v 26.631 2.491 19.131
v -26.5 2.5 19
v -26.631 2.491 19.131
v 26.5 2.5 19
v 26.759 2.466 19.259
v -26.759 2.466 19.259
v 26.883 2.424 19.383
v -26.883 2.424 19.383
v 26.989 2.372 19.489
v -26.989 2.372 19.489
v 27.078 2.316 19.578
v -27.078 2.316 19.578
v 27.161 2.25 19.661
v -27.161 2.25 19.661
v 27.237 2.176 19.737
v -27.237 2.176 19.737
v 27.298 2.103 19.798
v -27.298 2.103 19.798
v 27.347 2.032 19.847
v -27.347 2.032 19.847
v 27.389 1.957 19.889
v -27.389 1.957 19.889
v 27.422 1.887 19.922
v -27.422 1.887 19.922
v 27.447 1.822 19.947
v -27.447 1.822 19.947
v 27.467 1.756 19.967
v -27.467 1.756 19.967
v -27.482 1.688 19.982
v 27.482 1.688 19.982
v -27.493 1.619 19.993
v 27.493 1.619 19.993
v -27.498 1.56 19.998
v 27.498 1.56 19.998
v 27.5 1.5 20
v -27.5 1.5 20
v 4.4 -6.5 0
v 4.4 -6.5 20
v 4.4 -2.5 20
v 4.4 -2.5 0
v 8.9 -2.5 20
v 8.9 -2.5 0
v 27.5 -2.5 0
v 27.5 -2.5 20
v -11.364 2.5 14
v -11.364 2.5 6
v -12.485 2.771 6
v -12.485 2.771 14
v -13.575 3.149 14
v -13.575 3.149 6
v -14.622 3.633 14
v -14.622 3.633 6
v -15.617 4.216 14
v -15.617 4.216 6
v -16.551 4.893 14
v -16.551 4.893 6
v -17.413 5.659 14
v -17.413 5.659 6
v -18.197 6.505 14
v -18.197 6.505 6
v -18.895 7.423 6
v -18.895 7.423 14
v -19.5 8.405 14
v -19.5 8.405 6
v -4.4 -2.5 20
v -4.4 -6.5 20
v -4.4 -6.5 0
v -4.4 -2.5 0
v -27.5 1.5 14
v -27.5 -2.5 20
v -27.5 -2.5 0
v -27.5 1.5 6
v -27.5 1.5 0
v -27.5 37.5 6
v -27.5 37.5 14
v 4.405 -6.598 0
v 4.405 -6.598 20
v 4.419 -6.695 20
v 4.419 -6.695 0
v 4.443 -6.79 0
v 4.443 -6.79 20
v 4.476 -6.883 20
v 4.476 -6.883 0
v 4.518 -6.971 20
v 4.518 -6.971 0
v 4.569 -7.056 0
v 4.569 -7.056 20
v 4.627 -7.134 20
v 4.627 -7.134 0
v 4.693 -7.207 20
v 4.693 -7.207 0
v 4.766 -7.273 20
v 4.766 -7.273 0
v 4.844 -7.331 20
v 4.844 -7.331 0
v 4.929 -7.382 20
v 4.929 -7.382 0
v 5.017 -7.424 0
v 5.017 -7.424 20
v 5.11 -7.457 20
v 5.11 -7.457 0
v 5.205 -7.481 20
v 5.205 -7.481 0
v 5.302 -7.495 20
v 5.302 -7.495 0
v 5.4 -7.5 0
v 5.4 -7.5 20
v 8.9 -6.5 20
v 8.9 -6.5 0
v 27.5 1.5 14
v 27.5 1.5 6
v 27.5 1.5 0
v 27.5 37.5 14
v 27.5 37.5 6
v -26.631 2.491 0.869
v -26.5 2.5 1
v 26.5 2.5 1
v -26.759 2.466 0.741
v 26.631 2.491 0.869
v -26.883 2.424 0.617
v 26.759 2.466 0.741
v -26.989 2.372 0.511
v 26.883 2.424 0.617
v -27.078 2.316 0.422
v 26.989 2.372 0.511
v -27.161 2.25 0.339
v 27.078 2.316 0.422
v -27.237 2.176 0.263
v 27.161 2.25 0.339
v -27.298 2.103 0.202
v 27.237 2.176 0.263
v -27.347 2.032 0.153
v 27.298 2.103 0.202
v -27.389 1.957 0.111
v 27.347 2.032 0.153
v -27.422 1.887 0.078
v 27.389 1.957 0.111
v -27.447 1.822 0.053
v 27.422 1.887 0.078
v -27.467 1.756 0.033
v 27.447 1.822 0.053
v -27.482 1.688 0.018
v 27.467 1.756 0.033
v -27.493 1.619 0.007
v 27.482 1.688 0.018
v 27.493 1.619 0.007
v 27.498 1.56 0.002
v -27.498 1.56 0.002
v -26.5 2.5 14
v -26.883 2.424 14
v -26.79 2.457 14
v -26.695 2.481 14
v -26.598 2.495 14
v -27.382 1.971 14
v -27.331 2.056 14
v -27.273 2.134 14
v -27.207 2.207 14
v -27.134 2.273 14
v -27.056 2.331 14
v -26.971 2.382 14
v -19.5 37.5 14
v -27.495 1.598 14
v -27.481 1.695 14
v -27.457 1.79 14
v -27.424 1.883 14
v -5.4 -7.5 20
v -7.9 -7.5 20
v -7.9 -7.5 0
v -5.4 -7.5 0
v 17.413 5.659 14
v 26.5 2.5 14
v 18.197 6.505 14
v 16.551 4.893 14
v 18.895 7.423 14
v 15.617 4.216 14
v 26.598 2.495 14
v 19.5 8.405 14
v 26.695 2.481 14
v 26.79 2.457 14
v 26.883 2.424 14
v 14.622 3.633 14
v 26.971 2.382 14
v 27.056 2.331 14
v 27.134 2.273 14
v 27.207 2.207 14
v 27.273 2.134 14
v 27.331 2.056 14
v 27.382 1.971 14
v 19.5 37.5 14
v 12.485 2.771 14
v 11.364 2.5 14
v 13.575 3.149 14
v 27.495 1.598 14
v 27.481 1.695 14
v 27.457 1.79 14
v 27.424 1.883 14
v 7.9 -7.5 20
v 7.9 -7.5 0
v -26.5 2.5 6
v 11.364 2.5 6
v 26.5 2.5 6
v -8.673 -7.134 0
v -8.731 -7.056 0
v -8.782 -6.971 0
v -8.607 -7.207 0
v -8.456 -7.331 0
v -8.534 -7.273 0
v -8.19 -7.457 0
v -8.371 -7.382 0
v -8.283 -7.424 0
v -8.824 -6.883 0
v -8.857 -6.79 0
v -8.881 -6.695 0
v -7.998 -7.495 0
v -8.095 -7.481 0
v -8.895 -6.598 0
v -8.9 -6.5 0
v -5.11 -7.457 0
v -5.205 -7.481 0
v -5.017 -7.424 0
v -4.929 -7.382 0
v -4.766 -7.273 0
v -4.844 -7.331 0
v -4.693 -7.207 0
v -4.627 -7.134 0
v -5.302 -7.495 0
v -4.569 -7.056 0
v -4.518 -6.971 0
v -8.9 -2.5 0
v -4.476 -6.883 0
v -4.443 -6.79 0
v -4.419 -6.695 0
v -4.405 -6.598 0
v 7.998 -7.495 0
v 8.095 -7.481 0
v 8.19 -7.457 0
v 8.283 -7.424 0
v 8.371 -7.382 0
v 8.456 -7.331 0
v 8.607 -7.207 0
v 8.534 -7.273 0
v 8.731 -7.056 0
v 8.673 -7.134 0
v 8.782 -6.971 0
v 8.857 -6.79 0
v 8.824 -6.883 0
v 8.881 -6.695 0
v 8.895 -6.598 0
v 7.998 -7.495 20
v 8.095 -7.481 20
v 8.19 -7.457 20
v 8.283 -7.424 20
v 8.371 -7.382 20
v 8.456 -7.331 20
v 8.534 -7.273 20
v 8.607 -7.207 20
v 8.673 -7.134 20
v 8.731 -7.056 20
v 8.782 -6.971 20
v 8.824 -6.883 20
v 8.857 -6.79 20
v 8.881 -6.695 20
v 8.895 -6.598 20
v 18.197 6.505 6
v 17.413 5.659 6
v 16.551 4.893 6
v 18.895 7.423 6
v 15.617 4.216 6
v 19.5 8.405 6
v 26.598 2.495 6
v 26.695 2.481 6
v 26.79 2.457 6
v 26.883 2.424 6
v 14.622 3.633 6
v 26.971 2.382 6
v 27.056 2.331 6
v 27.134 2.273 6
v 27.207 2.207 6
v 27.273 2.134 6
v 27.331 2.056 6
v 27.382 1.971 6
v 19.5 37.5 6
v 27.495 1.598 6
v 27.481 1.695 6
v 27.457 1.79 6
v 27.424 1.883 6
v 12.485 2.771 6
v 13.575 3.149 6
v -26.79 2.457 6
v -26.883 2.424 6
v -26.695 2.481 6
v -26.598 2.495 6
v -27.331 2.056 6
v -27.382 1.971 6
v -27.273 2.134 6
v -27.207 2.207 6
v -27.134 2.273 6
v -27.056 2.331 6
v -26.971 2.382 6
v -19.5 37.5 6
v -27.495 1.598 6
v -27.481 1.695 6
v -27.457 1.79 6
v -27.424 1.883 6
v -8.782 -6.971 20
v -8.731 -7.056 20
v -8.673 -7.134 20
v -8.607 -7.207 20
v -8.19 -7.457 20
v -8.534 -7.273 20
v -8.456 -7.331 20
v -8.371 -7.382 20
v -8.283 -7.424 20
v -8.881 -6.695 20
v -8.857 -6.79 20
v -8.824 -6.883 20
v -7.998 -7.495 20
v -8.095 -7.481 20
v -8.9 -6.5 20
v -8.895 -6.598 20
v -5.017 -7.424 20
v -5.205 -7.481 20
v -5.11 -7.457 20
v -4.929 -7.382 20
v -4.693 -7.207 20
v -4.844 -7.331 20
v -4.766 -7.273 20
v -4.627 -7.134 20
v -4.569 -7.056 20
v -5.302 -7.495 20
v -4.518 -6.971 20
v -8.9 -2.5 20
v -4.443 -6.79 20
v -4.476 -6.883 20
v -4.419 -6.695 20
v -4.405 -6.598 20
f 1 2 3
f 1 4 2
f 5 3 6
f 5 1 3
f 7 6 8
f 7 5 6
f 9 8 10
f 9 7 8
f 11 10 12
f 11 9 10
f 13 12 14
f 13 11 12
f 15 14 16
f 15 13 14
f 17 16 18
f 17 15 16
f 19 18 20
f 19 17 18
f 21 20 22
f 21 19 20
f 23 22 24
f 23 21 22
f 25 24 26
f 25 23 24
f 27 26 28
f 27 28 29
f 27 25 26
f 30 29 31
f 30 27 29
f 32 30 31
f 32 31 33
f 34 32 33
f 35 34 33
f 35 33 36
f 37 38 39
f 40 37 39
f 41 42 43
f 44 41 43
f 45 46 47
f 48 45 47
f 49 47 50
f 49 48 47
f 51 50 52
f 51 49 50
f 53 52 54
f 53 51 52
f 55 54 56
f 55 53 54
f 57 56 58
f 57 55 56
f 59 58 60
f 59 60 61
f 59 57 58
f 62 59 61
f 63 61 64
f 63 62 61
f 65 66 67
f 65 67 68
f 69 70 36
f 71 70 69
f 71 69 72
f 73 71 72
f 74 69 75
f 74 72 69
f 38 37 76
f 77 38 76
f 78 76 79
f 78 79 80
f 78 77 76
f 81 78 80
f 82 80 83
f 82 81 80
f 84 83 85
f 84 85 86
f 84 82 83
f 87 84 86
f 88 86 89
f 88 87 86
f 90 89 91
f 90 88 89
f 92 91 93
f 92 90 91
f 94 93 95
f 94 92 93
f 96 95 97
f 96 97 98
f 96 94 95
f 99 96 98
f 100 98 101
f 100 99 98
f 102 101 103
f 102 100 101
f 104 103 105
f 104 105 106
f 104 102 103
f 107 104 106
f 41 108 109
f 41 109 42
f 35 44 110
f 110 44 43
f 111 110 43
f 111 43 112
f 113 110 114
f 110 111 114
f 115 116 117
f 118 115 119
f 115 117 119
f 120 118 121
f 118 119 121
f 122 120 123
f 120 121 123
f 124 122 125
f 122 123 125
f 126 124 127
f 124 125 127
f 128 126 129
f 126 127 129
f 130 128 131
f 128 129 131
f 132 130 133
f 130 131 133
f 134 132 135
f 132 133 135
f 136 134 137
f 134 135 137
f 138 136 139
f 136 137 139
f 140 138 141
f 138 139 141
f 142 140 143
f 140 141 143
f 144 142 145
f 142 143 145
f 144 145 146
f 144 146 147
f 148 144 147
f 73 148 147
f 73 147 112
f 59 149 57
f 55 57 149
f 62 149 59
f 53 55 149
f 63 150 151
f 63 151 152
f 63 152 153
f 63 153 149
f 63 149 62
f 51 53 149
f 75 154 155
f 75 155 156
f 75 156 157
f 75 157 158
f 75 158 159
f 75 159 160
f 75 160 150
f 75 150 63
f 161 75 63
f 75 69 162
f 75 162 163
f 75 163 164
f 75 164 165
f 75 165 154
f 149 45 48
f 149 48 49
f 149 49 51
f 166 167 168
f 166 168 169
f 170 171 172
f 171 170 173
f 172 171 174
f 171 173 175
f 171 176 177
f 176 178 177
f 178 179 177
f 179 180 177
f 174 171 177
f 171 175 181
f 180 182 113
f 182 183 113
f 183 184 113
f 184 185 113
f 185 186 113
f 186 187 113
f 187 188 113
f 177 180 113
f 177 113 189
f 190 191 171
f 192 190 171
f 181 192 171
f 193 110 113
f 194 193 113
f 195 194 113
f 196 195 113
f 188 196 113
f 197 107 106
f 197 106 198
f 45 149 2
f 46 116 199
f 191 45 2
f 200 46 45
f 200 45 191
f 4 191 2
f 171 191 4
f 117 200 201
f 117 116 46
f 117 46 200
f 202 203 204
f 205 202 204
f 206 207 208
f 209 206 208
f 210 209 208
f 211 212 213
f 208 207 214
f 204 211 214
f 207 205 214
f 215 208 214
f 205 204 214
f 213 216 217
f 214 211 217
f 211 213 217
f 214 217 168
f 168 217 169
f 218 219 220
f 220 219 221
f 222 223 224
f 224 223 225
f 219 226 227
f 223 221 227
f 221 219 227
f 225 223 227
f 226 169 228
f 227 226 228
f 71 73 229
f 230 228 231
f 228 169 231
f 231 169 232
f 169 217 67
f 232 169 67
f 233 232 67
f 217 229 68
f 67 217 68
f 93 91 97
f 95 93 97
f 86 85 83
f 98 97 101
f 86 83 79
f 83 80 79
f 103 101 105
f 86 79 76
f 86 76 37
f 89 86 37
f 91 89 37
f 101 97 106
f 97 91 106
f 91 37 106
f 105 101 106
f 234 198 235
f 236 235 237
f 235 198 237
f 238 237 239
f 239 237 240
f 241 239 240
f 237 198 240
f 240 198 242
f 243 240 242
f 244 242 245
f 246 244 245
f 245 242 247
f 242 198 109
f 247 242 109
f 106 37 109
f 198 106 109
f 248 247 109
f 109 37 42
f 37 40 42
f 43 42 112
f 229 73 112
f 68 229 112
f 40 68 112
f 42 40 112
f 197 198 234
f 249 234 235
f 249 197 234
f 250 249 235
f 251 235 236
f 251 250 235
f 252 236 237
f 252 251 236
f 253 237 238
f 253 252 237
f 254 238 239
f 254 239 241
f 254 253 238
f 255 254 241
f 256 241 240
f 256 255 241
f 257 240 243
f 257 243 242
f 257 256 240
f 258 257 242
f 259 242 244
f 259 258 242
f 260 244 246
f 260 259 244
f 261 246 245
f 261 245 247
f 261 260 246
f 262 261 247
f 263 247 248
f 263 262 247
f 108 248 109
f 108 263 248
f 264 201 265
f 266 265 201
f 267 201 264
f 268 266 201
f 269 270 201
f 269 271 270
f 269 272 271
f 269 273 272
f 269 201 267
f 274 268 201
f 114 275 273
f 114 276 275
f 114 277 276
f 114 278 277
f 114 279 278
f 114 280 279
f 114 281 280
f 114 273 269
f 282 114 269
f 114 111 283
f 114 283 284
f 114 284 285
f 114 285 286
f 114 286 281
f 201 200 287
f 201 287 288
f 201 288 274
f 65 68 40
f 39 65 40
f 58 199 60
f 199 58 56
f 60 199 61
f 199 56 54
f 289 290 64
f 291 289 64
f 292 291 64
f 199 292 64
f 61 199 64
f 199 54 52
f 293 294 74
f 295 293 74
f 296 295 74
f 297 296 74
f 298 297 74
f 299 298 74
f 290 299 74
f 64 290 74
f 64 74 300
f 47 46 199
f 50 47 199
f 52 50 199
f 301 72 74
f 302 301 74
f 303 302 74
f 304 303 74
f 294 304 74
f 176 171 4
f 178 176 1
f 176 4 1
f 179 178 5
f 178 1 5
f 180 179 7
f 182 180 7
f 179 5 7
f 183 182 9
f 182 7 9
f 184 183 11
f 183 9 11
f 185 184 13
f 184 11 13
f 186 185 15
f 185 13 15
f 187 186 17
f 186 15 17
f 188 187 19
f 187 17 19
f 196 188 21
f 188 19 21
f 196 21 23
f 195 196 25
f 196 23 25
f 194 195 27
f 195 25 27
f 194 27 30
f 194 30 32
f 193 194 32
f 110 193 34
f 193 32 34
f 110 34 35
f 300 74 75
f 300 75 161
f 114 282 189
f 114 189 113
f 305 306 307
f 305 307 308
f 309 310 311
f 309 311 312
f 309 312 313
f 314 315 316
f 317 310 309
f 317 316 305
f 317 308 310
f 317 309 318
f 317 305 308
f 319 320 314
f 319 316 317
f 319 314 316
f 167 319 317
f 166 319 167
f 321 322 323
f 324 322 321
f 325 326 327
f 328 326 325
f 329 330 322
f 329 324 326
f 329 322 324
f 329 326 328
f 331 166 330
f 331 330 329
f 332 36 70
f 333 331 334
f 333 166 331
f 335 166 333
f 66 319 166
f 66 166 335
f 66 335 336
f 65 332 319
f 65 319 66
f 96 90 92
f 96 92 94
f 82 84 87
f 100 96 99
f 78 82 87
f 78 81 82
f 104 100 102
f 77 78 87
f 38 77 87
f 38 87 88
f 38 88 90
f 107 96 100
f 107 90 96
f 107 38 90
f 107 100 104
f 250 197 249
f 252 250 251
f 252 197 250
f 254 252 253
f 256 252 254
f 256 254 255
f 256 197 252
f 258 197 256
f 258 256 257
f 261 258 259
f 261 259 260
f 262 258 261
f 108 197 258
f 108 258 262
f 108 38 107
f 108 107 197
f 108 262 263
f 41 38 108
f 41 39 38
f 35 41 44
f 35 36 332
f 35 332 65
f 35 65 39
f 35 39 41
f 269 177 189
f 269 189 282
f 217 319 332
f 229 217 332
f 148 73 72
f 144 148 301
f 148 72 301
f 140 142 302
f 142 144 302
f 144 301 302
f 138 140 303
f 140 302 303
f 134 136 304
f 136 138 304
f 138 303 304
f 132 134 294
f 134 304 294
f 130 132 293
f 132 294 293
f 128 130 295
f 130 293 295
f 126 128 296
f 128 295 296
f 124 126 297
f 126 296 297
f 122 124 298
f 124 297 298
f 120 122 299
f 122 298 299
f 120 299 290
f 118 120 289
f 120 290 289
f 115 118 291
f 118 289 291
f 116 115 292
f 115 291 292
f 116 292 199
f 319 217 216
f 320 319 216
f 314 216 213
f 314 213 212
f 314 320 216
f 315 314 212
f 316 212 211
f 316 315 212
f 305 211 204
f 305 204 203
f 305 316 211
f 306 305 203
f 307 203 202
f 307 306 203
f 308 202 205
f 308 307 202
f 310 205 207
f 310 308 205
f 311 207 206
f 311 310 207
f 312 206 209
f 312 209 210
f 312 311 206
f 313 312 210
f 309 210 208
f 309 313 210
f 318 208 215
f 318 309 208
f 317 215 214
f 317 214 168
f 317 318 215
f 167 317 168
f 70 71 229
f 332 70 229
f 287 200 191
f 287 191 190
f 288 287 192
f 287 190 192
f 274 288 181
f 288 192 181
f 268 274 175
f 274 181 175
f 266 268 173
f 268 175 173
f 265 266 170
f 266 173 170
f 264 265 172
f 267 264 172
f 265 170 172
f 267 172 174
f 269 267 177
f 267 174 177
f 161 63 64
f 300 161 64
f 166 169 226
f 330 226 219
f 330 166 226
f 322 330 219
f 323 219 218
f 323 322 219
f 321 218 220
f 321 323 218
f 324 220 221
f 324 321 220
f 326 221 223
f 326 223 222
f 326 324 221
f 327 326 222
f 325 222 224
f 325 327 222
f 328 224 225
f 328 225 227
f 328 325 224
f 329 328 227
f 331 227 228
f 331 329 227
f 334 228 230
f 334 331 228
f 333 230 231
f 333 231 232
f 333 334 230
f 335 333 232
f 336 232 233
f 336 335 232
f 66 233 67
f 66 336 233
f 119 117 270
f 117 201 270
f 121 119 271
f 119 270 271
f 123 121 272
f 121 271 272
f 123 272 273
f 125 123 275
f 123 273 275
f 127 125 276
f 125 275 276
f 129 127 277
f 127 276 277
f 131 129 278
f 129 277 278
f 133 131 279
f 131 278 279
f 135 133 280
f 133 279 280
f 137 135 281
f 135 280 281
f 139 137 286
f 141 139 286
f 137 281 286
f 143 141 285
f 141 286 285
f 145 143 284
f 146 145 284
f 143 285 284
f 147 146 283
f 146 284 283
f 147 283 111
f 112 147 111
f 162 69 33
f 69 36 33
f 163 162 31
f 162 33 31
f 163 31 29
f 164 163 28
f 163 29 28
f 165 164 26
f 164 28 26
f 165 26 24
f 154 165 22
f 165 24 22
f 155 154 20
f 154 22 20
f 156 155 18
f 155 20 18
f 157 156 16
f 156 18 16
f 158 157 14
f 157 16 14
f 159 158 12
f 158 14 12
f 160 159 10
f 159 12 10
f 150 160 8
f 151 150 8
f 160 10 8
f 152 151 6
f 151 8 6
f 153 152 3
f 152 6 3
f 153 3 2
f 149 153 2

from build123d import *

# Parameters (mm, degrees)
SKETCH1_W           = 55
SKETCH1_H           = 5
SKETCH1_W_2         = 4.5
BOSS_EXTRUDE2_DEPTH = 20
SKETCH2_W           = 8
SKETCH2_H           = 8
BOSS_EXTRUDE3_DEPTH = 35
FILLET1_R           = 1
BOSS_EXTRUDE4_DEPTH = 4


with BuildPart() as part:
    # Sketch1 → Boss-Extrude2 (new body)
    with BuildSketch(Plane.XY):
        Rectangle(SKETCH1_W, SKETCH1_H)
        with Locations((-6.65, -5)):
            Rectangle(SKETCH1_W_2, SKETCH1_H)
        with Locations((6.65, -5)):
            Rectangle(SKETCH1_W_2, SKETCH1_H)
    extrude(amount=BOSS_EXTRUDE2_DEPTH)

    # Sketch2 → Boss-Extrude3 (add)
    with BuildSketch(Plane(origin=(0, 2.5, 0), x_dir=(1, 0, 0), z_dir=(0, 1, 0))):
        with Locations((23.5, -10)):
            Rectangle(SKETCH2_W, SKETCH2_H)
        with Locations((-23.5, -10)):
            Rectangle(SKETCH2_W, SKETCH2_H)
    extrude(amount=BOSS_EXTRUDE3_DEPTH)

    # Fillet1
    fillet1_edges = [part.edges().sort_by_distance(p)[0] for p in [
        (0, 2.5, 20),
        (0, 2.5, 0),
        (8.9, -7.5, 10),
        (4.4, -7.5, 10),
        (-4.4, -7.5, 10),
        (-8.9, -7.5, 10),
        (-27.5, 2.5, 17),
        (27.5, 2.5, 17),
        (-27.5, 2.5, 3),
        (27.5, 2.5, 3),
    ]]
    fillet(fillet1_edges, radius=FILLET1_R)

    # Sketch9 → Boss-Extrude4 (add, symmetric)
    with BuildSketch(Plane.XY.offset(10)):
        with BuildLine():
            Line((-19.5, 8.405065213), (-19.5, 2.5))
            Line((-19.5, 2.5), (-11.364093889, 2.5))
            ThreePointArc((-11.364093889, 2.5), (-16.092079197, 4.543150534), (-19.5, 8.405065213))
        make_face()
    boss_extrude4 = extrude(amount=BOSS_EXTRUDE4_DEPTH, both=True)

    # Mirror1: Boss-Extrude4 across plane
    add(boss_extrude4.mirror(Plane(origin=(0, 0, 0), x_dir=(0, 0, 1), z_dir=(1, 0, 0))))


solid = part.part
